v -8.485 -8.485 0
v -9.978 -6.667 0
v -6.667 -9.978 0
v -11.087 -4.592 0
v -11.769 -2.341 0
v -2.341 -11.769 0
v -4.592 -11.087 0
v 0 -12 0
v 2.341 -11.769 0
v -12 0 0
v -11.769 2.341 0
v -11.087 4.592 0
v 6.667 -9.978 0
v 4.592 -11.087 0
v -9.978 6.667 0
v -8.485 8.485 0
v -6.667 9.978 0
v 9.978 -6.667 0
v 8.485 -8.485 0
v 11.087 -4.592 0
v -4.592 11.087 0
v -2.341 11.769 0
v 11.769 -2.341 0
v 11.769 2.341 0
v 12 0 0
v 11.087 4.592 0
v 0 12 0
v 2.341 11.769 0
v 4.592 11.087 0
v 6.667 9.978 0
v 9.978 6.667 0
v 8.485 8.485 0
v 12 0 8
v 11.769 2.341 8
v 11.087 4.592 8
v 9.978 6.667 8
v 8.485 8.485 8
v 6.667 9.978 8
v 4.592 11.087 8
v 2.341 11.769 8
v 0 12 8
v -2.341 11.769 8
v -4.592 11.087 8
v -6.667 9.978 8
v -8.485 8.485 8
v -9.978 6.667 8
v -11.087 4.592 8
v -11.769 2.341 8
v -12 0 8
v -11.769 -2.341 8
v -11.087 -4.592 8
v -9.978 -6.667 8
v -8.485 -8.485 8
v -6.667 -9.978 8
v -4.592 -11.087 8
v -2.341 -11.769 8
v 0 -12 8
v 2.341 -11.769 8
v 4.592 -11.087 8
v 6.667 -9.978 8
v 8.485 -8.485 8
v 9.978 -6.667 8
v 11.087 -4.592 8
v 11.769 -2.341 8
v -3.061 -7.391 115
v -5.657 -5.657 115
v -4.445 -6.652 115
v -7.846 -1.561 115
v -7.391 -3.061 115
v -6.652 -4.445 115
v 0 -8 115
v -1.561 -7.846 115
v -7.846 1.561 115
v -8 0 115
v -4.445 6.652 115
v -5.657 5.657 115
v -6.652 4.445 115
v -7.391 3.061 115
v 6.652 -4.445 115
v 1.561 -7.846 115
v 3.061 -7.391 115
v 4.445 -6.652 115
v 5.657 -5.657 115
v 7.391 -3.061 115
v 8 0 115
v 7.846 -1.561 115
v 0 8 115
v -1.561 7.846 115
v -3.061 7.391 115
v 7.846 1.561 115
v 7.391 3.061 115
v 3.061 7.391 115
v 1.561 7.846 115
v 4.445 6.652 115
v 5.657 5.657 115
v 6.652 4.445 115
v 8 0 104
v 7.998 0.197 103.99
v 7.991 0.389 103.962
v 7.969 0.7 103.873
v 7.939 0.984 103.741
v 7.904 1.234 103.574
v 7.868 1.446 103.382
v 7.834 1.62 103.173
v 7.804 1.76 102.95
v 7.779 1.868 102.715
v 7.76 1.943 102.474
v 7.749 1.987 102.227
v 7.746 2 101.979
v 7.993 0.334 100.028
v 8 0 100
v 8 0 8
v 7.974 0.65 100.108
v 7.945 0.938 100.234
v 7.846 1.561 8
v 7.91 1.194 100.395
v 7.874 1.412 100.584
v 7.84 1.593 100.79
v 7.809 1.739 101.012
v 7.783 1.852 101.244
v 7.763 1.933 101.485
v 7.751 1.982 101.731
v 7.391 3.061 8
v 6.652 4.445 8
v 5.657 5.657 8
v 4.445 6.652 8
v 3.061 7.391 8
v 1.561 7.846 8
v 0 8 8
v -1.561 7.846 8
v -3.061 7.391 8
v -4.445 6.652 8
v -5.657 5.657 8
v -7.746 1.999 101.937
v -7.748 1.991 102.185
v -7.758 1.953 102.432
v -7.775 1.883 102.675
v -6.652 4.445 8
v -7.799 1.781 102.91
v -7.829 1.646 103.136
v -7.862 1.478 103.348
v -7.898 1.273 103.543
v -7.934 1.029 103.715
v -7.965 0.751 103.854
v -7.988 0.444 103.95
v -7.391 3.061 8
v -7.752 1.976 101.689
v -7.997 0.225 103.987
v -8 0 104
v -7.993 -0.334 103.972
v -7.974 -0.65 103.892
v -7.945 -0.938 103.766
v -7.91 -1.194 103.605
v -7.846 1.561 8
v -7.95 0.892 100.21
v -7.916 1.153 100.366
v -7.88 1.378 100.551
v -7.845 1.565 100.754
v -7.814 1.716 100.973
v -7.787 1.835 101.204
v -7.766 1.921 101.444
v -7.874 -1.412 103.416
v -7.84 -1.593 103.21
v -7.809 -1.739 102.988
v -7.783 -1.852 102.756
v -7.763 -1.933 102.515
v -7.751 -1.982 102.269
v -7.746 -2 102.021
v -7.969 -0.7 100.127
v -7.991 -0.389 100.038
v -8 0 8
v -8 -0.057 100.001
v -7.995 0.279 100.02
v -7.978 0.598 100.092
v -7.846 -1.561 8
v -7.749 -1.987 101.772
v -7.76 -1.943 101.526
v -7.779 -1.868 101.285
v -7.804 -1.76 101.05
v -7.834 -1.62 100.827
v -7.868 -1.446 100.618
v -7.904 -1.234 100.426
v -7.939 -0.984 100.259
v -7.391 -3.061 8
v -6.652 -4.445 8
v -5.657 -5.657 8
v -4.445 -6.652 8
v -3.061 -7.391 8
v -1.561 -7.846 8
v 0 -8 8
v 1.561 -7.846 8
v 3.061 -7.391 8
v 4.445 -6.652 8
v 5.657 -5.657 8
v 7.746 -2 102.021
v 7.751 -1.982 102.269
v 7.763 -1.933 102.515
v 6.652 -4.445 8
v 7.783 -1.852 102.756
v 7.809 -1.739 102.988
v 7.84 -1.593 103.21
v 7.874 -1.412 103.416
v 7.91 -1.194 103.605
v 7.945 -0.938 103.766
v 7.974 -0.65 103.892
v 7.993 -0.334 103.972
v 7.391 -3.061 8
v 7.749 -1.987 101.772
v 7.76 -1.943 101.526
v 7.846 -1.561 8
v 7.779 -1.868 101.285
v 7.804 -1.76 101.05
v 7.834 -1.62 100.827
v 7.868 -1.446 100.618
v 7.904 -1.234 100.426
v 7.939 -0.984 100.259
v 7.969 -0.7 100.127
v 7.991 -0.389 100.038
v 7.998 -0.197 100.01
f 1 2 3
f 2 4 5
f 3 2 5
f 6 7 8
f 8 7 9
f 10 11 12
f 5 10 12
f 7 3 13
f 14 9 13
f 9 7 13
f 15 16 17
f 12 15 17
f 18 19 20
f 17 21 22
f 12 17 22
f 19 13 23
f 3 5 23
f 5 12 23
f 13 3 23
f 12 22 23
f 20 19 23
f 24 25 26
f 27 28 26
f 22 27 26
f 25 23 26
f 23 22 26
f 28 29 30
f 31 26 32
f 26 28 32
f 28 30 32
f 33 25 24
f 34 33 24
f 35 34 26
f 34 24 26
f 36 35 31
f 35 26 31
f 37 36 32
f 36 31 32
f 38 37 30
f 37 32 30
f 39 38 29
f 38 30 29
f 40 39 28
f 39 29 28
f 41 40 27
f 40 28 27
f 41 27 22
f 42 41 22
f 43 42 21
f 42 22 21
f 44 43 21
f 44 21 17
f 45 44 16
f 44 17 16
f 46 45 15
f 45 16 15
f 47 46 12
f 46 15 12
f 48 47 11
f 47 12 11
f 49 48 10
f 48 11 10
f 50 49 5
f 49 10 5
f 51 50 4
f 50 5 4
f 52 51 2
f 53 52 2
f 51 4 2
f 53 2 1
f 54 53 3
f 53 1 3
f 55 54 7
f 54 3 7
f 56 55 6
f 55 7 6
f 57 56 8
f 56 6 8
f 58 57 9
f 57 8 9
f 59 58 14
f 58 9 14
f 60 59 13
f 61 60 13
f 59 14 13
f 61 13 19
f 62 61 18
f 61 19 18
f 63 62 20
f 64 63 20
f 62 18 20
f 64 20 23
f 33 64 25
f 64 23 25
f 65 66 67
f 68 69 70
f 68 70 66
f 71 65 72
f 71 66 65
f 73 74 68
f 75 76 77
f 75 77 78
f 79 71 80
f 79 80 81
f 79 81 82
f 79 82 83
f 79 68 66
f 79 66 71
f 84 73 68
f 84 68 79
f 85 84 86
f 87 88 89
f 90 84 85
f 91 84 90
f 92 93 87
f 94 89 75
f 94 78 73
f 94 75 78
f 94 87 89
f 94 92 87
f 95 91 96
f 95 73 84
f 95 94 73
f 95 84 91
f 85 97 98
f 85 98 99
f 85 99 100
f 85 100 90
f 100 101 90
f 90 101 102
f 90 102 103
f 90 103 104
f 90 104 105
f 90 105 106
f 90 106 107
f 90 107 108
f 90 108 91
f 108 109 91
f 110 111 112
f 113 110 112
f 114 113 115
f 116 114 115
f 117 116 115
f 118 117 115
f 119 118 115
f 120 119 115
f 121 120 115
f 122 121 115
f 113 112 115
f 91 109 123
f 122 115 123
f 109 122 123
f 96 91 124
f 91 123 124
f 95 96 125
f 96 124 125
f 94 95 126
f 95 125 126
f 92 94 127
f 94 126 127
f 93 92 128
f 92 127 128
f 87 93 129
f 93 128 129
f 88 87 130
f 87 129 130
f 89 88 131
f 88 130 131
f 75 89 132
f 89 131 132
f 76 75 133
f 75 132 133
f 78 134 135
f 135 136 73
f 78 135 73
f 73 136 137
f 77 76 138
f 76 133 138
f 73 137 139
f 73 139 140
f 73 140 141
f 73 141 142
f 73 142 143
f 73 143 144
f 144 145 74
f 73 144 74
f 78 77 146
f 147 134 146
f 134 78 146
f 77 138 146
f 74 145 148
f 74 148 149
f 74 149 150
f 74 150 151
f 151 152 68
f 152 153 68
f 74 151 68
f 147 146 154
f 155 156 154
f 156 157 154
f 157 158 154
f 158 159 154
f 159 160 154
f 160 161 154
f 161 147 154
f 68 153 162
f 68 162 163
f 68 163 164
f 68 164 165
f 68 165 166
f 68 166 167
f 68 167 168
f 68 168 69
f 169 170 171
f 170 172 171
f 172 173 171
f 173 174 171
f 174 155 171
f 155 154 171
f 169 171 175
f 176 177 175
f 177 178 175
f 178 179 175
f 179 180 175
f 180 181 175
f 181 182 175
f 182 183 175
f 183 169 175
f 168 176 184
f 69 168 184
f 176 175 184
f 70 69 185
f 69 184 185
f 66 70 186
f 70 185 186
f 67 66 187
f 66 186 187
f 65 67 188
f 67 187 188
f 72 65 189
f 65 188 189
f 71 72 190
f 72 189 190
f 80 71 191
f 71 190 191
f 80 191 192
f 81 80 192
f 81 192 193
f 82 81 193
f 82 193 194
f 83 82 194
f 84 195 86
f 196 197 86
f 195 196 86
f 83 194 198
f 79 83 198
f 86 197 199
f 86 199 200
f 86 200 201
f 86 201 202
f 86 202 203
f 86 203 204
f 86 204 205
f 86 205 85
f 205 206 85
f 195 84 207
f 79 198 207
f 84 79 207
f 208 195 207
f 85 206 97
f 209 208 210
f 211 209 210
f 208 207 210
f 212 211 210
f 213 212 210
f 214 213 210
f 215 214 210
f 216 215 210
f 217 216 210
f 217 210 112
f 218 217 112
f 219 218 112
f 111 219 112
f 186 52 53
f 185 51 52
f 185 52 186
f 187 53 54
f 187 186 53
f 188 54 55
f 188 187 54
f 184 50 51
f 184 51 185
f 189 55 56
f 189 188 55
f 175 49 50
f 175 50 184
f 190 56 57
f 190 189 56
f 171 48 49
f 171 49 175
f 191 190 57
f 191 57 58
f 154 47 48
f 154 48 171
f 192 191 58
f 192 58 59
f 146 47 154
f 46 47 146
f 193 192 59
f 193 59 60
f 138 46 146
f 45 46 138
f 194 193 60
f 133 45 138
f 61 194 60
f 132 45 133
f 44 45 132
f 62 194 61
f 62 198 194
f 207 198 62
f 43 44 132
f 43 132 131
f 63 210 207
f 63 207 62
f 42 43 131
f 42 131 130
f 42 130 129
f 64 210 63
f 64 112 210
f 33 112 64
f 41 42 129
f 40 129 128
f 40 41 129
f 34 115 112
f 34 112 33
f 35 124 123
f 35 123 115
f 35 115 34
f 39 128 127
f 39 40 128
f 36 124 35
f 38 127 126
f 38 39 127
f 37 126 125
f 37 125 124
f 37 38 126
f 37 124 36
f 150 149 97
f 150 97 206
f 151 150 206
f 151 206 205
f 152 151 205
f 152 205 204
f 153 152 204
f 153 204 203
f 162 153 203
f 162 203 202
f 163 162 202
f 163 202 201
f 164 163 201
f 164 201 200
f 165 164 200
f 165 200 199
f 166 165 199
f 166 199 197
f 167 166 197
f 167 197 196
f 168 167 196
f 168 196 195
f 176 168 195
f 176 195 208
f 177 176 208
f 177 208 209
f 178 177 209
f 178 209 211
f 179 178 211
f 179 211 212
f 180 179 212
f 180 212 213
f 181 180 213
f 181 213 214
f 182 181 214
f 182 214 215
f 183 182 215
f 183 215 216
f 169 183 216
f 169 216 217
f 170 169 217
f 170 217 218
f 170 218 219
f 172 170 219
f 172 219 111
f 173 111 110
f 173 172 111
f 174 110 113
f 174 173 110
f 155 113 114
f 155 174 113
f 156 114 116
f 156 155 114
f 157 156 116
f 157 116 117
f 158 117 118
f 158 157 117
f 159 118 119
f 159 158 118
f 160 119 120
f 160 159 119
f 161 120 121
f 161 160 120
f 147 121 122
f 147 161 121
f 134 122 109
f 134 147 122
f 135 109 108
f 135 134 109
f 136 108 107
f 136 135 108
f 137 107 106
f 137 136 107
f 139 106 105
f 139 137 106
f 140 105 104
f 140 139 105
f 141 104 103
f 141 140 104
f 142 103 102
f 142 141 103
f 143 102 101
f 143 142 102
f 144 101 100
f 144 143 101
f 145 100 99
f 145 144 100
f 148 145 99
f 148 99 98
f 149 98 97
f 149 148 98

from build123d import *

# Parameters (mm, degrees)
SKETCH1_R               = 12
BOSS_EXTRUDE1_DEPTH     = 8
SKETCH1_3_R             = 8
BOSS_EXTRUDE2_DEPTH     = 115
CUT_EXTRUDE1_DEPTH      = 100
CUT_EXTRUDE1_DEPTH_BACK = 100
SKETCH3_R               = 2


with BuildPart() as part:
    # Sketch1 → Boss-Extrude1 (new body)
    with BuildSketch(Plane.XY):
        Circle(SKETCH1_R)
    extrude(amount=BOSS_EXTRUDE1_DEPTH)

    # Sketch1<3> → Boss-Extrude2 (add)
    with BuildSketch(Plane.XY):
        Circle(SKETCH1_3_R)
    extrude(amount=BOSS_EXTRUDE2_DEPTH)

    # Sketch3 → Cut-Extrude1 (cut, two sides: drawn at the far end of the back side and taken through both)
    with BuildSketch(Plane(origin=(0, 0, 0), x_dir=(0, 0, -1), z_dir=(1, 0, 0)).offset(-CUT_EXTRUDE1_DEPTH_BACK)):
        with Locations((-102, 0)):
            Circle(SKETCH3_R)
    extrude(amount=CUT_EXTRUDE1_DEPTH + CUT_EXTRUDE1_DEPTH_BACK, mode=Mode.SUBTRACT)


solid = part.part
